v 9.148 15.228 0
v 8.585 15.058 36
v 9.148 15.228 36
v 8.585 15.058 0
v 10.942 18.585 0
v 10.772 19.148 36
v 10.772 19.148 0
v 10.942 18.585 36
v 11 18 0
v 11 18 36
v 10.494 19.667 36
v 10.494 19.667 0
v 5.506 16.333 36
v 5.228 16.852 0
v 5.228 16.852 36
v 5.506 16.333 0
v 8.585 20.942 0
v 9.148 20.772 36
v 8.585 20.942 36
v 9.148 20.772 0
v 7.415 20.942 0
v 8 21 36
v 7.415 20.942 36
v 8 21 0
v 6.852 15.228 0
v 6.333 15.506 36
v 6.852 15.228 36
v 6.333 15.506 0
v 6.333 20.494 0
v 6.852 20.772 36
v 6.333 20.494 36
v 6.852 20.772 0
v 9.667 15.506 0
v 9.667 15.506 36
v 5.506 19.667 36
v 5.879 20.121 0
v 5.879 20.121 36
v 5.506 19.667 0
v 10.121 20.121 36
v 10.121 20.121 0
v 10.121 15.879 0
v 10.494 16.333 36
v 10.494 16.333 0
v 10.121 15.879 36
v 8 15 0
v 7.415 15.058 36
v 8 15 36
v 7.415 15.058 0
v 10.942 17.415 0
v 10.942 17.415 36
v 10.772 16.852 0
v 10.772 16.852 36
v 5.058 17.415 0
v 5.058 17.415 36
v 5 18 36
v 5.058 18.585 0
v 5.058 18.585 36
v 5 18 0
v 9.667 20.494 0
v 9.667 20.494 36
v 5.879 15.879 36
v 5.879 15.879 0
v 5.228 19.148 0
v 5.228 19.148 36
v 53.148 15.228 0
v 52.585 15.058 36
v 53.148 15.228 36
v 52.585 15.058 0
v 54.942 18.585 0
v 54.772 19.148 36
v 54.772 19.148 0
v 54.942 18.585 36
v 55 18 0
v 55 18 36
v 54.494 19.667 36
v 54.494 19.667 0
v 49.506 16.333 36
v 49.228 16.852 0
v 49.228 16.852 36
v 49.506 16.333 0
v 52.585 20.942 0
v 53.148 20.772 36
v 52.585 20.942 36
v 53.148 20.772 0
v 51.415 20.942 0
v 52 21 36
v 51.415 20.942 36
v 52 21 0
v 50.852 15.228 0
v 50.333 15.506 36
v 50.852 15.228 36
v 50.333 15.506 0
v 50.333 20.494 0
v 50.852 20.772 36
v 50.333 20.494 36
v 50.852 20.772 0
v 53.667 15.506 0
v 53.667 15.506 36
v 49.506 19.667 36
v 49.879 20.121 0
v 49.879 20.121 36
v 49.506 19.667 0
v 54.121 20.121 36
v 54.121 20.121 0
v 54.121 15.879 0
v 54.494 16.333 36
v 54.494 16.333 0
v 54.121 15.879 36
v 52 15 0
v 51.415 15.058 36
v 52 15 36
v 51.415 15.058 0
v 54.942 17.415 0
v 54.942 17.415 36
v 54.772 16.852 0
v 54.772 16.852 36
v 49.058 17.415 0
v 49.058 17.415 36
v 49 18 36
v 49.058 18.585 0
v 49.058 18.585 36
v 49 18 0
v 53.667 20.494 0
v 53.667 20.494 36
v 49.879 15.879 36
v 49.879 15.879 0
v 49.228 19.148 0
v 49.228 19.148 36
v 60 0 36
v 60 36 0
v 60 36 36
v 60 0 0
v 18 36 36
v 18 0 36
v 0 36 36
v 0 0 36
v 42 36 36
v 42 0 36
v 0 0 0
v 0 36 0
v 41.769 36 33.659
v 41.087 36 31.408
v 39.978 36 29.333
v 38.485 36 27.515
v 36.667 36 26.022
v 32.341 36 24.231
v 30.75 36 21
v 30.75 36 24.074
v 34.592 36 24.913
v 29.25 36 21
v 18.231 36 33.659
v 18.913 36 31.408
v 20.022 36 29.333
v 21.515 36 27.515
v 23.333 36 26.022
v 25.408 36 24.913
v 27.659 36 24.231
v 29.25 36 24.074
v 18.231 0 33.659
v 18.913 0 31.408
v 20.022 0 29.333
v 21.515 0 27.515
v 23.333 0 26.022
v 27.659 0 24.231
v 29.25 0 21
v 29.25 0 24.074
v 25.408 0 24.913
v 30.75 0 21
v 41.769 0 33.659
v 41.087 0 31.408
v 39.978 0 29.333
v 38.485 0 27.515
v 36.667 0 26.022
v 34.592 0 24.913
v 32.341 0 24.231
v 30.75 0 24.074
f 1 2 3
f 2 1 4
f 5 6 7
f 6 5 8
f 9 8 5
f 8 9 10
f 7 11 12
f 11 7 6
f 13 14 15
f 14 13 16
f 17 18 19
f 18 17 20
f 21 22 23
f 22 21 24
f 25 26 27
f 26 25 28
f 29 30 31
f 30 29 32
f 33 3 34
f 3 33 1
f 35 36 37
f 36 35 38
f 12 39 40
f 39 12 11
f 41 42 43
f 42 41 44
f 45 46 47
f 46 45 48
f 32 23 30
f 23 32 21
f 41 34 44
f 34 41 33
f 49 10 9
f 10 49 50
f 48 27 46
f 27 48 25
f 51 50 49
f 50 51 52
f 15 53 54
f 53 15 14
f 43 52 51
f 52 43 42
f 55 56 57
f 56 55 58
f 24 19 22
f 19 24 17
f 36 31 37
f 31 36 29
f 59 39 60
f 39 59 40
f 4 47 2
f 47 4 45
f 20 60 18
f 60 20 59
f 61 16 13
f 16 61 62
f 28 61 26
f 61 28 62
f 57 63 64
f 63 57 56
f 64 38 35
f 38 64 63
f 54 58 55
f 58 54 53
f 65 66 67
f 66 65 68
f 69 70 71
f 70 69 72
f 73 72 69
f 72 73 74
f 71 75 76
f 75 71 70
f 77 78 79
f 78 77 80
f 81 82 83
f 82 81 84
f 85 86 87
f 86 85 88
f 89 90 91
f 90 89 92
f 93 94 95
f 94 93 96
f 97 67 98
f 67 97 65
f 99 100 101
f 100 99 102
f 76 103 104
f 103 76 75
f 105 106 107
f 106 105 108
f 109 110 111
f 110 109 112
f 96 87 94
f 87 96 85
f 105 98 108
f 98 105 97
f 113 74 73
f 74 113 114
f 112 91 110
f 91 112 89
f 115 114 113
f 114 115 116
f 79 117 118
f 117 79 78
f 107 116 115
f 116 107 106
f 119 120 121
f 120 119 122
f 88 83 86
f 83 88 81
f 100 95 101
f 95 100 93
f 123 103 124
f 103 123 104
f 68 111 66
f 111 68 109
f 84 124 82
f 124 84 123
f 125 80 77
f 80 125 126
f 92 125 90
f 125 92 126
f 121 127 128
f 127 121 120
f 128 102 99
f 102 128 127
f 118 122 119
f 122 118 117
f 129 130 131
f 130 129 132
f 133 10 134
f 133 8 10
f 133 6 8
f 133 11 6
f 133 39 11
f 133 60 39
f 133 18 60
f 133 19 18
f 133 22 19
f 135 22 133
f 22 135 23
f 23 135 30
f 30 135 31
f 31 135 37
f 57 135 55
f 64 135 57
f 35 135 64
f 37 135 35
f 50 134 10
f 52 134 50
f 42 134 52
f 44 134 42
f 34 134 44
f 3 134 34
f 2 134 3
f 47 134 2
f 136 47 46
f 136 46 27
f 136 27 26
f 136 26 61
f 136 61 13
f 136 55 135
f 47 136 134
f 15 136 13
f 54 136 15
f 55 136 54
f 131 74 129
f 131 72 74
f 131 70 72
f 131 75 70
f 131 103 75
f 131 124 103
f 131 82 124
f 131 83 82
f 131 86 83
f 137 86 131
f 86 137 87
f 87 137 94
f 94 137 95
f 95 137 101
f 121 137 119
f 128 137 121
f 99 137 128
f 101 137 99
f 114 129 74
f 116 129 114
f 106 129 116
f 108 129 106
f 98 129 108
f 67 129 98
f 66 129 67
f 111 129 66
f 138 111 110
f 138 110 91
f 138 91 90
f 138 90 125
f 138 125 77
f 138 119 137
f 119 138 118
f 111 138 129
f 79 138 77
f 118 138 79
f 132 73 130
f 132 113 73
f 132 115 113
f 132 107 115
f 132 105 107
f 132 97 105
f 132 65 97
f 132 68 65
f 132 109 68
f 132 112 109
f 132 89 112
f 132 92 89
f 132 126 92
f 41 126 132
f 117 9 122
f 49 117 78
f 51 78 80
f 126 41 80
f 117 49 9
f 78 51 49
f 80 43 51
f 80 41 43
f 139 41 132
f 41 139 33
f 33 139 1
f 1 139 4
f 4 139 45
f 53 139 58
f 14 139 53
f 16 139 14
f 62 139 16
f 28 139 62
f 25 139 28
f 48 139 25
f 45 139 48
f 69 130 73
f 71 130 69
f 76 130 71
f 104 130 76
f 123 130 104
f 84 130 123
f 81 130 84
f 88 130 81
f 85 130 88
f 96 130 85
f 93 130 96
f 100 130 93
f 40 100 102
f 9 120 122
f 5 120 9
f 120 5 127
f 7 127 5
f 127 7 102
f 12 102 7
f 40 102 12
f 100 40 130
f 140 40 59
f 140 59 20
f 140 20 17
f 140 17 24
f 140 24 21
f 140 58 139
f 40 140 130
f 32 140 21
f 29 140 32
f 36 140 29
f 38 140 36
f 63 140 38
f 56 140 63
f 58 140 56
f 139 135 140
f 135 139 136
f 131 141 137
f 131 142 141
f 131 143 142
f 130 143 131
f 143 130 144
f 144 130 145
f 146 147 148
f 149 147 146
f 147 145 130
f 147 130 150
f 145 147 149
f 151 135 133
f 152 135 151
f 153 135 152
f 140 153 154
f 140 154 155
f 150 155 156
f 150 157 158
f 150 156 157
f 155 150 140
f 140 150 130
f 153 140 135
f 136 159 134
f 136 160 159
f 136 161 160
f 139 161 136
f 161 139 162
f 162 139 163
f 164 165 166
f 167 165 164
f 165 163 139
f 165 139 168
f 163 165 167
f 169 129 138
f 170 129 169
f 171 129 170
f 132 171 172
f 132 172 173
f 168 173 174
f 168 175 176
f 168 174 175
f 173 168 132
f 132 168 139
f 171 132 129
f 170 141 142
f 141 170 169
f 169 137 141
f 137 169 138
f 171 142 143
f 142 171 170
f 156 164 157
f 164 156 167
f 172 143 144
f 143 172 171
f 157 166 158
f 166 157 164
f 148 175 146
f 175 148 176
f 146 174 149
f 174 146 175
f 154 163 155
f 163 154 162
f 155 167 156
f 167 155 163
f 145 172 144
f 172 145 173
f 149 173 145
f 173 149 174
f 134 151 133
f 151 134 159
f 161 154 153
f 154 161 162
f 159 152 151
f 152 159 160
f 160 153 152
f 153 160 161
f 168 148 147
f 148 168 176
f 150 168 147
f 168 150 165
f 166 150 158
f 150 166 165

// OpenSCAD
$fn = 32;

// ----------------------------------------------------------------------
// Saddle clamp: split shaft clamp
// ----------------------------------------------------------------------

// --- parameters (mm) ---
blk_l = 60;               // block length, X
blk_w = 36;               // block width, Y
blk_h = 36;               // block height
clamp_r = 12;             // shaft groove radius
hole_r = 3;               // bolt hole radius
hole_m = 8;               // bolt hole margin from the ends
saw_w = 1.5;              // saw kerf width

saw_depth = clamp_r + 3;  // saw kerf depth

difference() {
  cube([blk_l, blk_w, blk_h]);
  translate([blk_l / 2, -1, blk_h])
    rotate([-90, 0, 0])
      cylinder(h = blk_w + 2, r = clamp_r);
  for (sx = [0, 1])
    translate([sx ? blk_l - hole_m : hole_m, blk_w / 2, -1])
      cylinder(r = hole_r, h = blk_h + 2);
  translate([blk_l / 2 - saw_w / 2, -1, blk_h - saw_depth])
    cube([saw_w, blk_w + 2, saw_depth + 1]);
}
